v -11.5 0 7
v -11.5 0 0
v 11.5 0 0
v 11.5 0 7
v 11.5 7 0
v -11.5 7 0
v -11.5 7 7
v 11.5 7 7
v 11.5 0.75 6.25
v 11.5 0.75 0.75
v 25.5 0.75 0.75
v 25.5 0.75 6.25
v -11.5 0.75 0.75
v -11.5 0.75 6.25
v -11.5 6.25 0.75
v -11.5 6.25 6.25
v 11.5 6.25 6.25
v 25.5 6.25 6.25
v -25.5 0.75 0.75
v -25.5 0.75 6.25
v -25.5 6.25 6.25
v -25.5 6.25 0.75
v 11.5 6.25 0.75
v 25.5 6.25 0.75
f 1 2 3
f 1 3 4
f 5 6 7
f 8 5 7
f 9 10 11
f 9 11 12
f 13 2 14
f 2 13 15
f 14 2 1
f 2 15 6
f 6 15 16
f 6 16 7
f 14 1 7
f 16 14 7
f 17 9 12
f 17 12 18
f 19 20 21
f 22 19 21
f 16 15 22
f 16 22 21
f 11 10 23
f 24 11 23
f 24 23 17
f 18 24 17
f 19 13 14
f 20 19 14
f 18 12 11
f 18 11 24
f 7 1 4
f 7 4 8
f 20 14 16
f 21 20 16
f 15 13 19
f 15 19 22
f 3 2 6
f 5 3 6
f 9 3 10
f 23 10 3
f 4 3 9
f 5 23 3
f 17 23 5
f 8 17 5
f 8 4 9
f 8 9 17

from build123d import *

# Parameters (mm, degrees)
F0_W     = 7
F0_H     = 7
F1_DEPTH = 11.5
F2_W     = 5.5
F2_H     = 5.5
F3_DEPTH = 14


with BuildPart() as f1:
    # F0 (on Right) → F1 (new body)
    with BuildSketch(Plane.YZ):
        with Locations((3.5, 3.5)):
            Rectangle(F0_W, F0_H)
    extrude(amount=F1_DEPTH)

    # F2 (on face) → F3 (join)
    with BuildSketch(Plane.YZ.offset(11.5)):
        with Locations((3.5, 3.5)):
            Rectangle(F2_W, F2_H)
    extrude(amount=F3_DEPTH)

    # F4: F1 across face


with BuildPart() as f1_1:
    add(f1.part)
    add(f1.part.mirror(Plane(origin=(0, 3.5, 3.5), x_dir=(0, 1, 0), z_dir=(-1, 0, 0))))


solid = f1_1.part
